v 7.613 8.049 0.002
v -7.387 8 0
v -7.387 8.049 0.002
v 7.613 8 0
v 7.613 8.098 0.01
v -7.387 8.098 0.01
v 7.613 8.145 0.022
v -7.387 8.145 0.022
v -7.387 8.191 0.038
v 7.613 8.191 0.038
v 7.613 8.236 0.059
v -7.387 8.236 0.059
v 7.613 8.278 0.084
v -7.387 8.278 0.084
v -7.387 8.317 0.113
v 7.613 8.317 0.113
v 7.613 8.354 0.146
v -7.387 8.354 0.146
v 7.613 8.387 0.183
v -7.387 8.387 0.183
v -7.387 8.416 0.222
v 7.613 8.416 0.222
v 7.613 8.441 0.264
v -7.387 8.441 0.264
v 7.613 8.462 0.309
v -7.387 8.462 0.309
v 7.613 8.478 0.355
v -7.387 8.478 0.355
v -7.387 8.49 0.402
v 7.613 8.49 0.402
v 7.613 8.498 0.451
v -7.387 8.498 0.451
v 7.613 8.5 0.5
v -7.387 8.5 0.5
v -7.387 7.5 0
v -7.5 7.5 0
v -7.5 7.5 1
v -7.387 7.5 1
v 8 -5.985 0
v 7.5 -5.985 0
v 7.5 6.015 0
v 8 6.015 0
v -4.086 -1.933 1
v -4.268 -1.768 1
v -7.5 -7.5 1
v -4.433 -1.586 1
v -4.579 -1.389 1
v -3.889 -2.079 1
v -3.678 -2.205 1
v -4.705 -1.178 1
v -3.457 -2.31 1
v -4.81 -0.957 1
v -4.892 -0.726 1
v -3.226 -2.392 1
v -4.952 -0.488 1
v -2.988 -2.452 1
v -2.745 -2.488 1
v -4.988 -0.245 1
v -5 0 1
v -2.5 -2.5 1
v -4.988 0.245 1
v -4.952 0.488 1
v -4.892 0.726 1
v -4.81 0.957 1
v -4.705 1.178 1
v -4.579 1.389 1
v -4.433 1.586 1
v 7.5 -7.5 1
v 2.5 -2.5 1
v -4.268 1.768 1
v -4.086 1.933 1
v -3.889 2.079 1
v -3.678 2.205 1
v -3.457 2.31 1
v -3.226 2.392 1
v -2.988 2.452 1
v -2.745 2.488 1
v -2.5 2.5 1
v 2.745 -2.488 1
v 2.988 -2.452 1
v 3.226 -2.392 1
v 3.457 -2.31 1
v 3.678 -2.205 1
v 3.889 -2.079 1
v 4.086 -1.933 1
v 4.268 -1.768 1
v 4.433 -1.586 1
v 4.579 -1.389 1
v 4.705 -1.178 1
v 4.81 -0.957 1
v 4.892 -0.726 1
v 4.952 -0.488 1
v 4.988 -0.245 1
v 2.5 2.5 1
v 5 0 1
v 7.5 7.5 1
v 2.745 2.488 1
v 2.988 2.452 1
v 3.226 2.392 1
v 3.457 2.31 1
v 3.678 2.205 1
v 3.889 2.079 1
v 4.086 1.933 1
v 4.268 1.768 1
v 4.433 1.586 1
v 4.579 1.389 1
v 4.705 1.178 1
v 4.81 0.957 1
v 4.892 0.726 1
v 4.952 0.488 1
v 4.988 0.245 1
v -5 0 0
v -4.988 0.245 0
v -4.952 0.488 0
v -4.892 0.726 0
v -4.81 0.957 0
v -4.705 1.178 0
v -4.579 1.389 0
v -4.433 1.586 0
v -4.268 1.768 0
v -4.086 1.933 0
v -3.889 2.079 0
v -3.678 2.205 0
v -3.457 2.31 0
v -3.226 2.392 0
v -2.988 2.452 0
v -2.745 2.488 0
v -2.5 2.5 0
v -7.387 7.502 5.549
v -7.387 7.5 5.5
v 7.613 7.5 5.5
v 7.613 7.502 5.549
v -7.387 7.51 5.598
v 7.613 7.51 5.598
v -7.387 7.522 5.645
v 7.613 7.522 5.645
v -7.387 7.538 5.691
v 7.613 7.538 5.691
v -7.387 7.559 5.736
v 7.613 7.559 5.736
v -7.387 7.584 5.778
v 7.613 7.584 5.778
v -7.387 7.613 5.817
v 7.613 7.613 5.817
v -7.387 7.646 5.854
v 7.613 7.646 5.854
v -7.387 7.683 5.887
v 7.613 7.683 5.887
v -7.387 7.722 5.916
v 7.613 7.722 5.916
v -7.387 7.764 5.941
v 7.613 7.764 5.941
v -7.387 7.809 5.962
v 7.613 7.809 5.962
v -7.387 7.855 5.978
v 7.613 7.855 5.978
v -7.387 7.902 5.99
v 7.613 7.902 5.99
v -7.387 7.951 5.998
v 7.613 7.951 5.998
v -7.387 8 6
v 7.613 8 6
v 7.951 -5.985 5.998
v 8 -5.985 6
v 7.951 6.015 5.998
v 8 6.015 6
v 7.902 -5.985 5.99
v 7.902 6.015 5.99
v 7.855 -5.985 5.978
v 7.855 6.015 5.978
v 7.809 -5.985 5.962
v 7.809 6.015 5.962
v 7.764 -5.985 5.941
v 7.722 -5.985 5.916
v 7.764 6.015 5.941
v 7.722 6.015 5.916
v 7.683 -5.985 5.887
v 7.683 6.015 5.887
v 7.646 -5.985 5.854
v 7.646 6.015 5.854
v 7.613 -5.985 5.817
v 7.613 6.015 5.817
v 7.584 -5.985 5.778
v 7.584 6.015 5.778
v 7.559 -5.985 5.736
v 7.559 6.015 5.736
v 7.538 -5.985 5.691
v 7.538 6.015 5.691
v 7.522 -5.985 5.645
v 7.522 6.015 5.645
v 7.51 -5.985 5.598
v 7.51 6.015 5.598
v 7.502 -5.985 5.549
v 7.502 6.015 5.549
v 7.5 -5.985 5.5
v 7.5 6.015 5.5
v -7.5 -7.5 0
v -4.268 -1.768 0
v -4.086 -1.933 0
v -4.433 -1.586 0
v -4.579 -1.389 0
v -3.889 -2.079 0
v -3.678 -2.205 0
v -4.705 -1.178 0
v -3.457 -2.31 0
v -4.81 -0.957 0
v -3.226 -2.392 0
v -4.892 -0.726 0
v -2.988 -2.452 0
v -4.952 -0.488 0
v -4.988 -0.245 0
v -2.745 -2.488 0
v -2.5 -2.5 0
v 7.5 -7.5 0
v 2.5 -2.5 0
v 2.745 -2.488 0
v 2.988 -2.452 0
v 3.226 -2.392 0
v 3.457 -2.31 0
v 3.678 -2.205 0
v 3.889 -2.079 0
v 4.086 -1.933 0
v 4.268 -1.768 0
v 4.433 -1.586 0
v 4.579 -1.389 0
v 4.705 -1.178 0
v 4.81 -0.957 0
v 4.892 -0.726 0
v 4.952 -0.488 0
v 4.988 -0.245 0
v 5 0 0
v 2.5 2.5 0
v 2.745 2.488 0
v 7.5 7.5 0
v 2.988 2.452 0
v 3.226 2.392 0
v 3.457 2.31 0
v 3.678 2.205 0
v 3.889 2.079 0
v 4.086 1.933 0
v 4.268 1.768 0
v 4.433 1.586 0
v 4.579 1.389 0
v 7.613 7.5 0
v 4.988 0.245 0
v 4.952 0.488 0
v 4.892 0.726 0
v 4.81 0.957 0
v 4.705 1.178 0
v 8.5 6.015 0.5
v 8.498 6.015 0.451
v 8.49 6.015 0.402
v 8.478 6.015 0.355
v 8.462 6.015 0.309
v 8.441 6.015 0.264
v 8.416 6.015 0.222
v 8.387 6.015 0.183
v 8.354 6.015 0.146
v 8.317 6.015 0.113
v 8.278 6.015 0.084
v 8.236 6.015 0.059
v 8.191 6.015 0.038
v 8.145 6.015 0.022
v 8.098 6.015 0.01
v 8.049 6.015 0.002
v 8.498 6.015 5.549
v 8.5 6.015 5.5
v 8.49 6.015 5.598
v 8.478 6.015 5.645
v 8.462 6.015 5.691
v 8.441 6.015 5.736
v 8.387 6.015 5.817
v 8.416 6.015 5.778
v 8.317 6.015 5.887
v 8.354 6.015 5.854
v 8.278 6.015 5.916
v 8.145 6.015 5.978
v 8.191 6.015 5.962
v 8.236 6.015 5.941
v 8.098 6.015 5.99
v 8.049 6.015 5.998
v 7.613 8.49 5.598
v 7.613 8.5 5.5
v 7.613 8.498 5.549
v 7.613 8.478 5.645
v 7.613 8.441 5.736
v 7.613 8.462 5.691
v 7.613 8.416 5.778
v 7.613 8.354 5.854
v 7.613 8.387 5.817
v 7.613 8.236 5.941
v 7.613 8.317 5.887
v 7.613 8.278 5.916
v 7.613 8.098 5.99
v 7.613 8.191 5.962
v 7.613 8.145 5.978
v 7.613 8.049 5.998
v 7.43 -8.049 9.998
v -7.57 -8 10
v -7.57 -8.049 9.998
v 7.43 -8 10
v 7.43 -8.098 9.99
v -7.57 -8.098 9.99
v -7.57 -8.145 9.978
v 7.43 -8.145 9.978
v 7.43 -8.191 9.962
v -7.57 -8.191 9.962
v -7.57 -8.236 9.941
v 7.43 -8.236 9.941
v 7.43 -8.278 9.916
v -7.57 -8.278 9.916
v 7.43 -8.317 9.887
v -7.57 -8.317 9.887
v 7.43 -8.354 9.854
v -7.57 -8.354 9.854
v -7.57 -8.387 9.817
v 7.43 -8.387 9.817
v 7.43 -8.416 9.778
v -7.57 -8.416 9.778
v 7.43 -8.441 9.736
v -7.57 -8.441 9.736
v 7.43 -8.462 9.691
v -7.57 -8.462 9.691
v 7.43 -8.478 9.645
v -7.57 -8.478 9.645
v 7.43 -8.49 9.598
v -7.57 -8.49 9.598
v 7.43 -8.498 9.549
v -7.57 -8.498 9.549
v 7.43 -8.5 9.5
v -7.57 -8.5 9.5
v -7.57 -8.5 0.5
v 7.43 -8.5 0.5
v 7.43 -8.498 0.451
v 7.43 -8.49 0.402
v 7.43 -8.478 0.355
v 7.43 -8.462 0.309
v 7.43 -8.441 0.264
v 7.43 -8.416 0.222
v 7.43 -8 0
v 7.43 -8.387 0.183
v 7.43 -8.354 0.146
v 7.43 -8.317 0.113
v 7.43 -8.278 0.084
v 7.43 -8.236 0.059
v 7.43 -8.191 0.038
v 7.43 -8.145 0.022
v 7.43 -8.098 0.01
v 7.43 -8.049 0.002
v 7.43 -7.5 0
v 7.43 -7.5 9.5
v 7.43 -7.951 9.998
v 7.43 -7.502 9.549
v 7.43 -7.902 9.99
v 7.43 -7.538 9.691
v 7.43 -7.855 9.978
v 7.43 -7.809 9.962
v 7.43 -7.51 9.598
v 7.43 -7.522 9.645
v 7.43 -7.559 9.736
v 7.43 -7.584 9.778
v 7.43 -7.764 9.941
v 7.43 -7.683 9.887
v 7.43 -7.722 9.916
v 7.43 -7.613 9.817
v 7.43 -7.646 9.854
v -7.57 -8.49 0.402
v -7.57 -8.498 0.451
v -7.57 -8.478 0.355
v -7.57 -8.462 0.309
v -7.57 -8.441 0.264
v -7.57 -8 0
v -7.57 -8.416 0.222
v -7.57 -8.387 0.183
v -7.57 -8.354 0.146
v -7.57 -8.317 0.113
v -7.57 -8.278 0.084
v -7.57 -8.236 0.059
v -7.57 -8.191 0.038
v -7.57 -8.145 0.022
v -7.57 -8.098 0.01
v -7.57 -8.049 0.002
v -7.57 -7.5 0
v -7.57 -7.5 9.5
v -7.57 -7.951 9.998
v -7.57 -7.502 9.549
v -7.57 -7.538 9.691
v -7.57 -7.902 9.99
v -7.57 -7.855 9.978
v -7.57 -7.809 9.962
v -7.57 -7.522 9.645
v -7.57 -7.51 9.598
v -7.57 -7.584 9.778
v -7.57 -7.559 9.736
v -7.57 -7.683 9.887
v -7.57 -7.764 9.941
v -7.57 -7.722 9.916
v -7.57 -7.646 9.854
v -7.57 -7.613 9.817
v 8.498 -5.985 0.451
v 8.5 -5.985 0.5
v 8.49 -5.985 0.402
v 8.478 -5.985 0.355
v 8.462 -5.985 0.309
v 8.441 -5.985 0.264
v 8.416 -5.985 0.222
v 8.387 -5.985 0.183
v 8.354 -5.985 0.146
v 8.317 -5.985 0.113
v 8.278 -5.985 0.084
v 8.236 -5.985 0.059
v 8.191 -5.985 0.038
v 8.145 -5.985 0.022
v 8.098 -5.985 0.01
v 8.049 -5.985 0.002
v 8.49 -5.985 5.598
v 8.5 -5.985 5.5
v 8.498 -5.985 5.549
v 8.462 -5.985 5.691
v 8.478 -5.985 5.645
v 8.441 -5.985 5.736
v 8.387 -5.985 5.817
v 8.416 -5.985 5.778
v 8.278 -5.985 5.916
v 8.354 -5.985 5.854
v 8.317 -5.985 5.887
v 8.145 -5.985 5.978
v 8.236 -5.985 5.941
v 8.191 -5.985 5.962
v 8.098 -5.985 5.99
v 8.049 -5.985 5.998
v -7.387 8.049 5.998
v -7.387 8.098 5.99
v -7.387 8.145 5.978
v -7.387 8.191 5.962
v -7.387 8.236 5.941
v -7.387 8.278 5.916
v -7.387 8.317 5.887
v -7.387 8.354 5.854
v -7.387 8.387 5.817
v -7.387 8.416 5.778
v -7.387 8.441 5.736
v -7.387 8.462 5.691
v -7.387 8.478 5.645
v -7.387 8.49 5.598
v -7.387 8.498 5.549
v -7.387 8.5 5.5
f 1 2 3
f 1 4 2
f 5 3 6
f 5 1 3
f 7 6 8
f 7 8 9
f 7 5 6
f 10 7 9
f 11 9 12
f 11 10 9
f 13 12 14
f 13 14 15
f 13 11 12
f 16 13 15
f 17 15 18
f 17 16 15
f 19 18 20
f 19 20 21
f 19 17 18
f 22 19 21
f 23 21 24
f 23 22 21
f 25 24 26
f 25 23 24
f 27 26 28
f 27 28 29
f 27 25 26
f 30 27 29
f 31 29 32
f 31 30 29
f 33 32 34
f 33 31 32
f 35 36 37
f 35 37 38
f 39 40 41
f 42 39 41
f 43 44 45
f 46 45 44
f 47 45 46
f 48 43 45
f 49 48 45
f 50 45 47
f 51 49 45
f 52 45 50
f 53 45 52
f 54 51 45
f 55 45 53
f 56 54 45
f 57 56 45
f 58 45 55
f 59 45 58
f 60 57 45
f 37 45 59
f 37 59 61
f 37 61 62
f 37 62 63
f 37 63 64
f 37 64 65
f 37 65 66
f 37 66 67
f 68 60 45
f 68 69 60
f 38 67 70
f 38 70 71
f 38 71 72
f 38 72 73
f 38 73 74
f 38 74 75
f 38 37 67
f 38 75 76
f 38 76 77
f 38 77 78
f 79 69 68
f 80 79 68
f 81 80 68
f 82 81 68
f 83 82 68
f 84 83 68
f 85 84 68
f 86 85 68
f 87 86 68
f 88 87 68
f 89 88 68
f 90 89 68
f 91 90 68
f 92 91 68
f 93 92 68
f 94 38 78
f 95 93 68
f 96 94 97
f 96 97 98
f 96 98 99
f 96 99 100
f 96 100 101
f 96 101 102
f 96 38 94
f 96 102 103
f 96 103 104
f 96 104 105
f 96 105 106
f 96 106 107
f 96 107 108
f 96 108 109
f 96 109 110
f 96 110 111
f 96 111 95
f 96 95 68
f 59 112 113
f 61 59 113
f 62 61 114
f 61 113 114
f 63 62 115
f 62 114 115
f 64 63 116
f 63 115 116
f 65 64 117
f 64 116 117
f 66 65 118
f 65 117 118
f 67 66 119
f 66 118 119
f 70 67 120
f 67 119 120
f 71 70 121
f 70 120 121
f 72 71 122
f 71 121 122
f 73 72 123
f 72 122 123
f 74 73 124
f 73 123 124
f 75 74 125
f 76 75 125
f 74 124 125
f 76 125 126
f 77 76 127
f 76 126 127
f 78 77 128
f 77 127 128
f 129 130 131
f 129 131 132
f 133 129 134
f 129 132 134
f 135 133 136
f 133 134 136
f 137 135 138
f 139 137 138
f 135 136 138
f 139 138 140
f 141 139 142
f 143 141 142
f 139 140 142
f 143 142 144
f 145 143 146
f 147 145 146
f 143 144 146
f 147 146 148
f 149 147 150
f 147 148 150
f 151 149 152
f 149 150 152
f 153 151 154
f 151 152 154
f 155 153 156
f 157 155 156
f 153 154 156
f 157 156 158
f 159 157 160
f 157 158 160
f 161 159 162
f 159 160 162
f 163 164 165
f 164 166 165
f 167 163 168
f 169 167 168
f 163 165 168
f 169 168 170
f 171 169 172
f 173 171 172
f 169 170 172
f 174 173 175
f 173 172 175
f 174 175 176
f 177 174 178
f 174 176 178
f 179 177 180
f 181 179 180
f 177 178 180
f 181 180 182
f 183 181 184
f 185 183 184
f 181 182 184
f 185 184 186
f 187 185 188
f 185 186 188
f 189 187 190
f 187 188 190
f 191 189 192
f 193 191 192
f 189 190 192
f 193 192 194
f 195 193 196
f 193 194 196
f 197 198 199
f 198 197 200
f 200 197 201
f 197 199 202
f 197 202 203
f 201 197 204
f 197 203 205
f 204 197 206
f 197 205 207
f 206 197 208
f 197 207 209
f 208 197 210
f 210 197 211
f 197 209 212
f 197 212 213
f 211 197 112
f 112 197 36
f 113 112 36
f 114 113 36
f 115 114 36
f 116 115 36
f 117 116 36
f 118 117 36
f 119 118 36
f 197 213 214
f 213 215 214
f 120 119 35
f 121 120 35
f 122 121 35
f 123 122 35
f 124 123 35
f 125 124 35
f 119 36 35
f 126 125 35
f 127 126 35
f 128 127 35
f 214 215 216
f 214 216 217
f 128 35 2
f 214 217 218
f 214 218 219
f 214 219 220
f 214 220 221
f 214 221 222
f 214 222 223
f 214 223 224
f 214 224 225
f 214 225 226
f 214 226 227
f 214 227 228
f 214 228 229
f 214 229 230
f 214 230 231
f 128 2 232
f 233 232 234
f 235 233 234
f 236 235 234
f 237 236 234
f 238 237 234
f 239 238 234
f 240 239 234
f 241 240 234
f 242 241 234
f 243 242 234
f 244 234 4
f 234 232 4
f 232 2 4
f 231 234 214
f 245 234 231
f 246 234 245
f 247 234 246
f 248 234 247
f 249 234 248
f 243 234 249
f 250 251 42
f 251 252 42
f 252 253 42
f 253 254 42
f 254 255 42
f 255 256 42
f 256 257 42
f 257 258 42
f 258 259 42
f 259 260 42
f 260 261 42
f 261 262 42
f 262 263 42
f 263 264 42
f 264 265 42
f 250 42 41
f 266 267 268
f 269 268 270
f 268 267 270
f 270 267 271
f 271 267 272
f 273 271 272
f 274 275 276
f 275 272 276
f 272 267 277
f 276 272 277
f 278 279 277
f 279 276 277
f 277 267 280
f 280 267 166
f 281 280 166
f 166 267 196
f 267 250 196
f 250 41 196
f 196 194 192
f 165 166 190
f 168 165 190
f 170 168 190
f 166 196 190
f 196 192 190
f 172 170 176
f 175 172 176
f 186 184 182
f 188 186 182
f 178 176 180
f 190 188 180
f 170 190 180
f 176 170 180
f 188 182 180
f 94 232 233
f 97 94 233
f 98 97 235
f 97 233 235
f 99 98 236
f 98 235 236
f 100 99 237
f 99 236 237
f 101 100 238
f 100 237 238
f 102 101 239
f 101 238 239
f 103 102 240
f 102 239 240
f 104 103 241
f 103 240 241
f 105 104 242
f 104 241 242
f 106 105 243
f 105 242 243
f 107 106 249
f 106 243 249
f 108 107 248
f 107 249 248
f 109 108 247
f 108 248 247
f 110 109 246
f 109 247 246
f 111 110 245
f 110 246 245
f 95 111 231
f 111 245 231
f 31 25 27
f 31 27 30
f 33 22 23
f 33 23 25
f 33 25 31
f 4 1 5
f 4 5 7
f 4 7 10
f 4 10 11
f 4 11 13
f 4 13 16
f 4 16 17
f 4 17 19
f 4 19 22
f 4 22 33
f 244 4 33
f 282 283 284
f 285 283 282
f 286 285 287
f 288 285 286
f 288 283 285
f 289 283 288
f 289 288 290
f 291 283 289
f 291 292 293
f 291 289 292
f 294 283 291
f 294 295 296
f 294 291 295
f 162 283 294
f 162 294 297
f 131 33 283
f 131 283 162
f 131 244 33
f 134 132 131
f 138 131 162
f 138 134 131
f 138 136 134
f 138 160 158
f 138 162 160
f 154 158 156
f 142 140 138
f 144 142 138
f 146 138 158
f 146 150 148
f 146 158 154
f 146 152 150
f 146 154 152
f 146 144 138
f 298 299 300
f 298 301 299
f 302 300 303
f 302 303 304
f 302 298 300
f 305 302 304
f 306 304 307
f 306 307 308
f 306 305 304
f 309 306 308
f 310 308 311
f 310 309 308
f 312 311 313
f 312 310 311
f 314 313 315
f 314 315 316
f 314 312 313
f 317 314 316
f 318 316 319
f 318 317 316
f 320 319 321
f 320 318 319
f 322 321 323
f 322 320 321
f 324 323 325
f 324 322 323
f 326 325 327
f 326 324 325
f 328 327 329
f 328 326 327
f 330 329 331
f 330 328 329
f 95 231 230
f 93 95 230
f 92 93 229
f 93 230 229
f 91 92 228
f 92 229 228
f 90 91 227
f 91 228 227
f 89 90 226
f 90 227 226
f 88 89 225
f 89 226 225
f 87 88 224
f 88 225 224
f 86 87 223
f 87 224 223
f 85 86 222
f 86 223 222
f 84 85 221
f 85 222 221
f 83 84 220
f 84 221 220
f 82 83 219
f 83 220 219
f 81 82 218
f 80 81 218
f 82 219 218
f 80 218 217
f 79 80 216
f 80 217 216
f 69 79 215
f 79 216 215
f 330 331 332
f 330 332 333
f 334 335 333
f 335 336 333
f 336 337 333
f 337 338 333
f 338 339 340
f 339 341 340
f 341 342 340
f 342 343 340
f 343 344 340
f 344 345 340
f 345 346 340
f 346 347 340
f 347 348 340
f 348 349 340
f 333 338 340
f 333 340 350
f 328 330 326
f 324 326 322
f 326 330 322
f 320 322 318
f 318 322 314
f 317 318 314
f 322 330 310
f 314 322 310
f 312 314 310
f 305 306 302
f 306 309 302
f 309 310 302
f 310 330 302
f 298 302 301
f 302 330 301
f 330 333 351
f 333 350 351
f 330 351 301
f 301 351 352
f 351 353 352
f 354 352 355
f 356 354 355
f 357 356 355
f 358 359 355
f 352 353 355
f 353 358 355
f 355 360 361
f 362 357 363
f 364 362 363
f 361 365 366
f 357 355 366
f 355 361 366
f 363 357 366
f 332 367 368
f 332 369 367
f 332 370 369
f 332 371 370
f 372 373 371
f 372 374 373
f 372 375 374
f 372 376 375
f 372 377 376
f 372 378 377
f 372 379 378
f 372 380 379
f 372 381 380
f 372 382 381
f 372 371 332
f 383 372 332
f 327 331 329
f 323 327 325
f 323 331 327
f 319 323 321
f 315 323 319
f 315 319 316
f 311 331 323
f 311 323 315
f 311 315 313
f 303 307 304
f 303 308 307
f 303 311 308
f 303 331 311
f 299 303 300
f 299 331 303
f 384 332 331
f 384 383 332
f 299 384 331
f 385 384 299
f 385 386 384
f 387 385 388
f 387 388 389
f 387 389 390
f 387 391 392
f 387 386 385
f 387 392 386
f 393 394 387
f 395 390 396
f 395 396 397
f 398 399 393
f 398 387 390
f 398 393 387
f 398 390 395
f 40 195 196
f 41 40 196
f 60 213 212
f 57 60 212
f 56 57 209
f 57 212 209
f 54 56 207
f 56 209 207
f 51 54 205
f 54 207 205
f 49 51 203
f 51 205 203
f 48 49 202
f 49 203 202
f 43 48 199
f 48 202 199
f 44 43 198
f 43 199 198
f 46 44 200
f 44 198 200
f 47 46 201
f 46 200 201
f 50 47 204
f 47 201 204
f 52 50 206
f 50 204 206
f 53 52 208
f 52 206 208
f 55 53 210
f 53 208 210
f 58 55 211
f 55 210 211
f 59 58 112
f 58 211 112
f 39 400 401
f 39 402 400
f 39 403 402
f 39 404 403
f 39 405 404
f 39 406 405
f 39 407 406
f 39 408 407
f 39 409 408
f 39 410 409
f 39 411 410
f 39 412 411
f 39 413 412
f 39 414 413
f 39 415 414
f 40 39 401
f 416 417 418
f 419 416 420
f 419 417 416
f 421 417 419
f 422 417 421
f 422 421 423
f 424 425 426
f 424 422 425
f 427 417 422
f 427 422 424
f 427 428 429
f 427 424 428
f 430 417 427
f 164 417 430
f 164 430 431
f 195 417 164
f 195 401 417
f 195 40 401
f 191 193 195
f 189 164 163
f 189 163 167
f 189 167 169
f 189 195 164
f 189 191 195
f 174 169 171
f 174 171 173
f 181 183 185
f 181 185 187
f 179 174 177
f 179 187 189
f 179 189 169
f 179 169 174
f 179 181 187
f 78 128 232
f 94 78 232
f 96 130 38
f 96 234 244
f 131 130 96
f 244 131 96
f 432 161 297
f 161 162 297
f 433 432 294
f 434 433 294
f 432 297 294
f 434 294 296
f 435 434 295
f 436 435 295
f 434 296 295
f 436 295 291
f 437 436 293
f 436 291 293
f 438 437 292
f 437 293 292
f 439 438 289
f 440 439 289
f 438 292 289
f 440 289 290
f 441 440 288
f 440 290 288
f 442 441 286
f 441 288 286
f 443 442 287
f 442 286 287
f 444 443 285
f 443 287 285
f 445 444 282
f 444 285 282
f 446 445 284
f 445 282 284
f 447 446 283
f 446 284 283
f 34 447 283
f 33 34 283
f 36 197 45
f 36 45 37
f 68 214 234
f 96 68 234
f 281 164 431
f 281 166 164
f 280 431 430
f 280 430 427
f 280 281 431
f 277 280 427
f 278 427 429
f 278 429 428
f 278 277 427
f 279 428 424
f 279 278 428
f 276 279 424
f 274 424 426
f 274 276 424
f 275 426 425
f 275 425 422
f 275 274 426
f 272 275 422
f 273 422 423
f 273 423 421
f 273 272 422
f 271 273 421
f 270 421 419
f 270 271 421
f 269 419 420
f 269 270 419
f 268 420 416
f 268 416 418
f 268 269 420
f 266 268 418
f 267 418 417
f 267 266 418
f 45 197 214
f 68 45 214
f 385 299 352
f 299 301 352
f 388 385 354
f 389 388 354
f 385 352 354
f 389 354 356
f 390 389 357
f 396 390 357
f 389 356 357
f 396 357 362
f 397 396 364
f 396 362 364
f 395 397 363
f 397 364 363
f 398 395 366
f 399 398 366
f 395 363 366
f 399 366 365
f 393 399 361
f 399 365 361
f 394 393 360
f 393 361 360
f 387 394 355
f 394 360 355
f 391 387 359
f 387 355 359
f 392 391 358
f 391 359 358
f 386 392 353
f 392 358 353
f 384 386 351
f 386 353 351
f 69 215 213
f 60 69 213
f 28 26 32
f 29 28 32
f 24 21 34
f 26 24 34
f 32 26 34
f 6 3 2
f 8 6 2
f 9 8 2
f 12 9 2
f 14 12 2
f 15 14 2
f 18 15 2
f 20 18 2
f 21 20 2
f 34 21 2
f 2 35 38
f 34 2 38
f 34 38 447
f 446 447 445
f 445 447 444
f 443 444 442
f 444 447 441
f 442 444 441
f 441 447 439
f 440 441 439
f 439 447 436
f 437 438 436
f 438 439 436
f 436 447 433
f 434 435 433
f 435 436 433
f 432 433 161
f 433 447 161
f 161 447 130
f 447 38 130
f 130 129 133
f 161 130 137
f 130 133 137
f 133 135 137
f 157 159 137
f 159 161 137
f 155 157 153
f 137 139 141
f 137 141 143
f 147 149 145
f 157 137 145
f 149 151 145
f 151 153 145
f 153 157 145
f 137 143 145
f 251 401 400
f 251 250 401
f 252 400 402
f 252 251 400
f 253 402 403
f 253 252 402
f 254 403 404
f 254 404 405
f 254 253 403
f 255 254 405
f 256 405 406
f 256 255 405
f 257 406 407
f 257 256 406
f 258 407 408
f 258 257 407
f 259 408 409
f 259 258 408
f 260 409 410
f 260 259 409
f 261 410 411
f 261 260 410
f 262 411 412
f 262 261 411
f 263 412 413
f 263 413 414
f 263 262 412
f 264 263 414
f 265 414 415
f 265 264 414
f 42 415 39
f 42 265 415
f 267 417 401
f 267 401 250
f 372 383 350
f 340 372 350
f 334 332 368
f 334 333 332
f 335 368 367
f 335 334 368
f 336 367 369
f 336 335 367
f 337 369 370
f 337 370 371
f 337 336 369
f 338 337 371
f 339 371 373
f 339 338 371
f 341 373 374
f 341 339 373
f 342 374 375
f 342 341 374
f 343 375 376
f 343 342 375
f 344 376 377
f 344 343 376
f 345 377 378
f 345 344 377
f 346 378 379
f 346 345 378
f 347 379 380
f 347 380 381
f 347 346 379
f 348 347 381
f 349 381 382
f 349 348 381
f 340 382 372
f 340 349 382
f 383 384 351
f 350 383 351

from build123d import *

# Parameters (mm, degrees)
F9_W      = 12
F9_H      = 6
F10_DEPTH = 1
F8_W      = 15
F8_H      = 6
F11_DEPTH = 1
F7_W      = 15
F7_H      = 10
F12_DEPTH = 1
F0_W      = 15
F0_H      = 15
F13_DEPTH = 1
F14_R     = 0.5
F15_R     = 0.49999
F15_2_R   = 0.49999
F16_R     = 0.49999
F16_2_R   = 0.49999
F17_DEPTH = 1


# Not quite as in the source:
# - a fillet or chamfer is up to 0.001 mm smaller than in the source, because OpenCascade refuses the exact size


with BuildPart() as f10:
    # F9 (on plane+point) → F10 (new body)
    with BuildSketch(Plane.YZ.offset(7.5)):
        with Locations((0.0150063767, 3)):
            Rectangle(F9_W, F9_H)
    extrude(amount=F10_DEPTH)

    # F14
    f14_edges = [f10.edges().sort_by_distance(p)[0] for p in [
        (8.5, 0.015006, 6),
    ]]
    fillet(f14_edges, radius=F14_R)

    # F15 (radius 0.5 in the source; OpenCascade refuses exactly that, so slightly less here)
    f15_edges = [f10.edges().sort_by_distance(p)[0] for p in [
        (7.5, 0.015006, 6),
        (8.5, 0.015006, 0),
    ]]
    fillet(f15_edges, radius=F15_R)

    # F0 (on Top) → F17 (cut)
    with BuildSketch(Plane.XY):
        with BuildLine():
            Line((2.5, 2.5), (-2.5, 2.5))
            ThreePointArc((-2.5, 2.5), (-4.267766953, 1.767766953), (-5, 0))
            ThreePointArc((-5, 0), (-4.267766953, -1.767766953), (-2.5, -2.5))
            Line((-2.5, -2.5), (2.5, -2.5))
            ThreePointArc((2.5, -2.5), (4.267766953, -1.767766953), (5, 0))
            ThreePointArc((5, 0), (4.267766953, 1.767766953), (2.5, 2.5))
        make_face()
    extrude(amount=F17_DEPTH, mode=Mode.SUBTRACT)


with BuildPart() as f11:
    # F8 (on plane+point) → F11 (new body)
    with BuildSketch(Plane.XZ.offset(-7.5)):
        with Locations((0.1134890686, 3)):
            Rectangle(F8_W, F8_H)
    extrude(amount=-F11_DEPTH)

    # F0 (on Top) → F13 (join)
    with BuildSketch(Plane.XY):
        Rectangle(F0_W, F0_H)
        with BuildLine():
            ThreePointArc((-5, 0), (-4.267766953, 1.767766953), (-2.5, 2.5))
            Line((-2.5, 2.5), (2.5, 2.5))
            ThreePointArc((2.5, 2.5), (4.267766953, 1.767766953), (5, 0))
            ThreePointArc((5, 0), (4.267766953, -1.767766953), (2.5, -2.5))
            Line((2.5, -2.5), (-2.5, -2.5))
            ThreePointArc((-2.5, -2.5), (-4.267766953, -1.767766953), (-5, 0))
        make_face(mode=Mode.SUBTRACT)
    extrude(amount=F13_DEPTH)

    # F16#2 (radius 0.5 in the source; OpenCascade refuses exactly that, so slightly less here)
    f16_2_edges = [f11.edges().sort_by_distance(p)[0] for p in [
        (0.113489, 8.5, 0),
        (0.113489, 8.5, 6),
        (0.113489, 7.5, 6),
    ]]
    fillet(f16_2_edges, radius=F16_2_R)


with BuildPart() as f12:
    # F7 (on plane+point) → F12 (new body)
    with BuildSketch(Plane.XZ.offset(7.5)):
        with Locations((-0.0702422911, 5)):
            Rectangle(F7_W, F7_H)
    extrude(amount=F12_DEPTH)

    # F15#2 (radius 0.5 in the source; OpenCascade refuses exactly that, so slightly less here)
    f15_2_edges = [f12.edges().sort_by_distance(p)[0] for p in [
        (-0.070242, -8.5, 10),
        (-0.070242, -7.5, 10),
    ]]
    fillet(f15_2_edges, radius=F15_2_R)

    # F16 (radius 0.5 in the source; OpenCascade refuses exactly that, so slightly less here)
    f16_edges = [f12.edges().sort_by_distance(p)[0] for p in [
        (-0.070242, -8.5, 0),
    ]]
    fillet(f16_edges, radius=F16_R)


solid = Compound([f10.part, f11.part, f12.part])
